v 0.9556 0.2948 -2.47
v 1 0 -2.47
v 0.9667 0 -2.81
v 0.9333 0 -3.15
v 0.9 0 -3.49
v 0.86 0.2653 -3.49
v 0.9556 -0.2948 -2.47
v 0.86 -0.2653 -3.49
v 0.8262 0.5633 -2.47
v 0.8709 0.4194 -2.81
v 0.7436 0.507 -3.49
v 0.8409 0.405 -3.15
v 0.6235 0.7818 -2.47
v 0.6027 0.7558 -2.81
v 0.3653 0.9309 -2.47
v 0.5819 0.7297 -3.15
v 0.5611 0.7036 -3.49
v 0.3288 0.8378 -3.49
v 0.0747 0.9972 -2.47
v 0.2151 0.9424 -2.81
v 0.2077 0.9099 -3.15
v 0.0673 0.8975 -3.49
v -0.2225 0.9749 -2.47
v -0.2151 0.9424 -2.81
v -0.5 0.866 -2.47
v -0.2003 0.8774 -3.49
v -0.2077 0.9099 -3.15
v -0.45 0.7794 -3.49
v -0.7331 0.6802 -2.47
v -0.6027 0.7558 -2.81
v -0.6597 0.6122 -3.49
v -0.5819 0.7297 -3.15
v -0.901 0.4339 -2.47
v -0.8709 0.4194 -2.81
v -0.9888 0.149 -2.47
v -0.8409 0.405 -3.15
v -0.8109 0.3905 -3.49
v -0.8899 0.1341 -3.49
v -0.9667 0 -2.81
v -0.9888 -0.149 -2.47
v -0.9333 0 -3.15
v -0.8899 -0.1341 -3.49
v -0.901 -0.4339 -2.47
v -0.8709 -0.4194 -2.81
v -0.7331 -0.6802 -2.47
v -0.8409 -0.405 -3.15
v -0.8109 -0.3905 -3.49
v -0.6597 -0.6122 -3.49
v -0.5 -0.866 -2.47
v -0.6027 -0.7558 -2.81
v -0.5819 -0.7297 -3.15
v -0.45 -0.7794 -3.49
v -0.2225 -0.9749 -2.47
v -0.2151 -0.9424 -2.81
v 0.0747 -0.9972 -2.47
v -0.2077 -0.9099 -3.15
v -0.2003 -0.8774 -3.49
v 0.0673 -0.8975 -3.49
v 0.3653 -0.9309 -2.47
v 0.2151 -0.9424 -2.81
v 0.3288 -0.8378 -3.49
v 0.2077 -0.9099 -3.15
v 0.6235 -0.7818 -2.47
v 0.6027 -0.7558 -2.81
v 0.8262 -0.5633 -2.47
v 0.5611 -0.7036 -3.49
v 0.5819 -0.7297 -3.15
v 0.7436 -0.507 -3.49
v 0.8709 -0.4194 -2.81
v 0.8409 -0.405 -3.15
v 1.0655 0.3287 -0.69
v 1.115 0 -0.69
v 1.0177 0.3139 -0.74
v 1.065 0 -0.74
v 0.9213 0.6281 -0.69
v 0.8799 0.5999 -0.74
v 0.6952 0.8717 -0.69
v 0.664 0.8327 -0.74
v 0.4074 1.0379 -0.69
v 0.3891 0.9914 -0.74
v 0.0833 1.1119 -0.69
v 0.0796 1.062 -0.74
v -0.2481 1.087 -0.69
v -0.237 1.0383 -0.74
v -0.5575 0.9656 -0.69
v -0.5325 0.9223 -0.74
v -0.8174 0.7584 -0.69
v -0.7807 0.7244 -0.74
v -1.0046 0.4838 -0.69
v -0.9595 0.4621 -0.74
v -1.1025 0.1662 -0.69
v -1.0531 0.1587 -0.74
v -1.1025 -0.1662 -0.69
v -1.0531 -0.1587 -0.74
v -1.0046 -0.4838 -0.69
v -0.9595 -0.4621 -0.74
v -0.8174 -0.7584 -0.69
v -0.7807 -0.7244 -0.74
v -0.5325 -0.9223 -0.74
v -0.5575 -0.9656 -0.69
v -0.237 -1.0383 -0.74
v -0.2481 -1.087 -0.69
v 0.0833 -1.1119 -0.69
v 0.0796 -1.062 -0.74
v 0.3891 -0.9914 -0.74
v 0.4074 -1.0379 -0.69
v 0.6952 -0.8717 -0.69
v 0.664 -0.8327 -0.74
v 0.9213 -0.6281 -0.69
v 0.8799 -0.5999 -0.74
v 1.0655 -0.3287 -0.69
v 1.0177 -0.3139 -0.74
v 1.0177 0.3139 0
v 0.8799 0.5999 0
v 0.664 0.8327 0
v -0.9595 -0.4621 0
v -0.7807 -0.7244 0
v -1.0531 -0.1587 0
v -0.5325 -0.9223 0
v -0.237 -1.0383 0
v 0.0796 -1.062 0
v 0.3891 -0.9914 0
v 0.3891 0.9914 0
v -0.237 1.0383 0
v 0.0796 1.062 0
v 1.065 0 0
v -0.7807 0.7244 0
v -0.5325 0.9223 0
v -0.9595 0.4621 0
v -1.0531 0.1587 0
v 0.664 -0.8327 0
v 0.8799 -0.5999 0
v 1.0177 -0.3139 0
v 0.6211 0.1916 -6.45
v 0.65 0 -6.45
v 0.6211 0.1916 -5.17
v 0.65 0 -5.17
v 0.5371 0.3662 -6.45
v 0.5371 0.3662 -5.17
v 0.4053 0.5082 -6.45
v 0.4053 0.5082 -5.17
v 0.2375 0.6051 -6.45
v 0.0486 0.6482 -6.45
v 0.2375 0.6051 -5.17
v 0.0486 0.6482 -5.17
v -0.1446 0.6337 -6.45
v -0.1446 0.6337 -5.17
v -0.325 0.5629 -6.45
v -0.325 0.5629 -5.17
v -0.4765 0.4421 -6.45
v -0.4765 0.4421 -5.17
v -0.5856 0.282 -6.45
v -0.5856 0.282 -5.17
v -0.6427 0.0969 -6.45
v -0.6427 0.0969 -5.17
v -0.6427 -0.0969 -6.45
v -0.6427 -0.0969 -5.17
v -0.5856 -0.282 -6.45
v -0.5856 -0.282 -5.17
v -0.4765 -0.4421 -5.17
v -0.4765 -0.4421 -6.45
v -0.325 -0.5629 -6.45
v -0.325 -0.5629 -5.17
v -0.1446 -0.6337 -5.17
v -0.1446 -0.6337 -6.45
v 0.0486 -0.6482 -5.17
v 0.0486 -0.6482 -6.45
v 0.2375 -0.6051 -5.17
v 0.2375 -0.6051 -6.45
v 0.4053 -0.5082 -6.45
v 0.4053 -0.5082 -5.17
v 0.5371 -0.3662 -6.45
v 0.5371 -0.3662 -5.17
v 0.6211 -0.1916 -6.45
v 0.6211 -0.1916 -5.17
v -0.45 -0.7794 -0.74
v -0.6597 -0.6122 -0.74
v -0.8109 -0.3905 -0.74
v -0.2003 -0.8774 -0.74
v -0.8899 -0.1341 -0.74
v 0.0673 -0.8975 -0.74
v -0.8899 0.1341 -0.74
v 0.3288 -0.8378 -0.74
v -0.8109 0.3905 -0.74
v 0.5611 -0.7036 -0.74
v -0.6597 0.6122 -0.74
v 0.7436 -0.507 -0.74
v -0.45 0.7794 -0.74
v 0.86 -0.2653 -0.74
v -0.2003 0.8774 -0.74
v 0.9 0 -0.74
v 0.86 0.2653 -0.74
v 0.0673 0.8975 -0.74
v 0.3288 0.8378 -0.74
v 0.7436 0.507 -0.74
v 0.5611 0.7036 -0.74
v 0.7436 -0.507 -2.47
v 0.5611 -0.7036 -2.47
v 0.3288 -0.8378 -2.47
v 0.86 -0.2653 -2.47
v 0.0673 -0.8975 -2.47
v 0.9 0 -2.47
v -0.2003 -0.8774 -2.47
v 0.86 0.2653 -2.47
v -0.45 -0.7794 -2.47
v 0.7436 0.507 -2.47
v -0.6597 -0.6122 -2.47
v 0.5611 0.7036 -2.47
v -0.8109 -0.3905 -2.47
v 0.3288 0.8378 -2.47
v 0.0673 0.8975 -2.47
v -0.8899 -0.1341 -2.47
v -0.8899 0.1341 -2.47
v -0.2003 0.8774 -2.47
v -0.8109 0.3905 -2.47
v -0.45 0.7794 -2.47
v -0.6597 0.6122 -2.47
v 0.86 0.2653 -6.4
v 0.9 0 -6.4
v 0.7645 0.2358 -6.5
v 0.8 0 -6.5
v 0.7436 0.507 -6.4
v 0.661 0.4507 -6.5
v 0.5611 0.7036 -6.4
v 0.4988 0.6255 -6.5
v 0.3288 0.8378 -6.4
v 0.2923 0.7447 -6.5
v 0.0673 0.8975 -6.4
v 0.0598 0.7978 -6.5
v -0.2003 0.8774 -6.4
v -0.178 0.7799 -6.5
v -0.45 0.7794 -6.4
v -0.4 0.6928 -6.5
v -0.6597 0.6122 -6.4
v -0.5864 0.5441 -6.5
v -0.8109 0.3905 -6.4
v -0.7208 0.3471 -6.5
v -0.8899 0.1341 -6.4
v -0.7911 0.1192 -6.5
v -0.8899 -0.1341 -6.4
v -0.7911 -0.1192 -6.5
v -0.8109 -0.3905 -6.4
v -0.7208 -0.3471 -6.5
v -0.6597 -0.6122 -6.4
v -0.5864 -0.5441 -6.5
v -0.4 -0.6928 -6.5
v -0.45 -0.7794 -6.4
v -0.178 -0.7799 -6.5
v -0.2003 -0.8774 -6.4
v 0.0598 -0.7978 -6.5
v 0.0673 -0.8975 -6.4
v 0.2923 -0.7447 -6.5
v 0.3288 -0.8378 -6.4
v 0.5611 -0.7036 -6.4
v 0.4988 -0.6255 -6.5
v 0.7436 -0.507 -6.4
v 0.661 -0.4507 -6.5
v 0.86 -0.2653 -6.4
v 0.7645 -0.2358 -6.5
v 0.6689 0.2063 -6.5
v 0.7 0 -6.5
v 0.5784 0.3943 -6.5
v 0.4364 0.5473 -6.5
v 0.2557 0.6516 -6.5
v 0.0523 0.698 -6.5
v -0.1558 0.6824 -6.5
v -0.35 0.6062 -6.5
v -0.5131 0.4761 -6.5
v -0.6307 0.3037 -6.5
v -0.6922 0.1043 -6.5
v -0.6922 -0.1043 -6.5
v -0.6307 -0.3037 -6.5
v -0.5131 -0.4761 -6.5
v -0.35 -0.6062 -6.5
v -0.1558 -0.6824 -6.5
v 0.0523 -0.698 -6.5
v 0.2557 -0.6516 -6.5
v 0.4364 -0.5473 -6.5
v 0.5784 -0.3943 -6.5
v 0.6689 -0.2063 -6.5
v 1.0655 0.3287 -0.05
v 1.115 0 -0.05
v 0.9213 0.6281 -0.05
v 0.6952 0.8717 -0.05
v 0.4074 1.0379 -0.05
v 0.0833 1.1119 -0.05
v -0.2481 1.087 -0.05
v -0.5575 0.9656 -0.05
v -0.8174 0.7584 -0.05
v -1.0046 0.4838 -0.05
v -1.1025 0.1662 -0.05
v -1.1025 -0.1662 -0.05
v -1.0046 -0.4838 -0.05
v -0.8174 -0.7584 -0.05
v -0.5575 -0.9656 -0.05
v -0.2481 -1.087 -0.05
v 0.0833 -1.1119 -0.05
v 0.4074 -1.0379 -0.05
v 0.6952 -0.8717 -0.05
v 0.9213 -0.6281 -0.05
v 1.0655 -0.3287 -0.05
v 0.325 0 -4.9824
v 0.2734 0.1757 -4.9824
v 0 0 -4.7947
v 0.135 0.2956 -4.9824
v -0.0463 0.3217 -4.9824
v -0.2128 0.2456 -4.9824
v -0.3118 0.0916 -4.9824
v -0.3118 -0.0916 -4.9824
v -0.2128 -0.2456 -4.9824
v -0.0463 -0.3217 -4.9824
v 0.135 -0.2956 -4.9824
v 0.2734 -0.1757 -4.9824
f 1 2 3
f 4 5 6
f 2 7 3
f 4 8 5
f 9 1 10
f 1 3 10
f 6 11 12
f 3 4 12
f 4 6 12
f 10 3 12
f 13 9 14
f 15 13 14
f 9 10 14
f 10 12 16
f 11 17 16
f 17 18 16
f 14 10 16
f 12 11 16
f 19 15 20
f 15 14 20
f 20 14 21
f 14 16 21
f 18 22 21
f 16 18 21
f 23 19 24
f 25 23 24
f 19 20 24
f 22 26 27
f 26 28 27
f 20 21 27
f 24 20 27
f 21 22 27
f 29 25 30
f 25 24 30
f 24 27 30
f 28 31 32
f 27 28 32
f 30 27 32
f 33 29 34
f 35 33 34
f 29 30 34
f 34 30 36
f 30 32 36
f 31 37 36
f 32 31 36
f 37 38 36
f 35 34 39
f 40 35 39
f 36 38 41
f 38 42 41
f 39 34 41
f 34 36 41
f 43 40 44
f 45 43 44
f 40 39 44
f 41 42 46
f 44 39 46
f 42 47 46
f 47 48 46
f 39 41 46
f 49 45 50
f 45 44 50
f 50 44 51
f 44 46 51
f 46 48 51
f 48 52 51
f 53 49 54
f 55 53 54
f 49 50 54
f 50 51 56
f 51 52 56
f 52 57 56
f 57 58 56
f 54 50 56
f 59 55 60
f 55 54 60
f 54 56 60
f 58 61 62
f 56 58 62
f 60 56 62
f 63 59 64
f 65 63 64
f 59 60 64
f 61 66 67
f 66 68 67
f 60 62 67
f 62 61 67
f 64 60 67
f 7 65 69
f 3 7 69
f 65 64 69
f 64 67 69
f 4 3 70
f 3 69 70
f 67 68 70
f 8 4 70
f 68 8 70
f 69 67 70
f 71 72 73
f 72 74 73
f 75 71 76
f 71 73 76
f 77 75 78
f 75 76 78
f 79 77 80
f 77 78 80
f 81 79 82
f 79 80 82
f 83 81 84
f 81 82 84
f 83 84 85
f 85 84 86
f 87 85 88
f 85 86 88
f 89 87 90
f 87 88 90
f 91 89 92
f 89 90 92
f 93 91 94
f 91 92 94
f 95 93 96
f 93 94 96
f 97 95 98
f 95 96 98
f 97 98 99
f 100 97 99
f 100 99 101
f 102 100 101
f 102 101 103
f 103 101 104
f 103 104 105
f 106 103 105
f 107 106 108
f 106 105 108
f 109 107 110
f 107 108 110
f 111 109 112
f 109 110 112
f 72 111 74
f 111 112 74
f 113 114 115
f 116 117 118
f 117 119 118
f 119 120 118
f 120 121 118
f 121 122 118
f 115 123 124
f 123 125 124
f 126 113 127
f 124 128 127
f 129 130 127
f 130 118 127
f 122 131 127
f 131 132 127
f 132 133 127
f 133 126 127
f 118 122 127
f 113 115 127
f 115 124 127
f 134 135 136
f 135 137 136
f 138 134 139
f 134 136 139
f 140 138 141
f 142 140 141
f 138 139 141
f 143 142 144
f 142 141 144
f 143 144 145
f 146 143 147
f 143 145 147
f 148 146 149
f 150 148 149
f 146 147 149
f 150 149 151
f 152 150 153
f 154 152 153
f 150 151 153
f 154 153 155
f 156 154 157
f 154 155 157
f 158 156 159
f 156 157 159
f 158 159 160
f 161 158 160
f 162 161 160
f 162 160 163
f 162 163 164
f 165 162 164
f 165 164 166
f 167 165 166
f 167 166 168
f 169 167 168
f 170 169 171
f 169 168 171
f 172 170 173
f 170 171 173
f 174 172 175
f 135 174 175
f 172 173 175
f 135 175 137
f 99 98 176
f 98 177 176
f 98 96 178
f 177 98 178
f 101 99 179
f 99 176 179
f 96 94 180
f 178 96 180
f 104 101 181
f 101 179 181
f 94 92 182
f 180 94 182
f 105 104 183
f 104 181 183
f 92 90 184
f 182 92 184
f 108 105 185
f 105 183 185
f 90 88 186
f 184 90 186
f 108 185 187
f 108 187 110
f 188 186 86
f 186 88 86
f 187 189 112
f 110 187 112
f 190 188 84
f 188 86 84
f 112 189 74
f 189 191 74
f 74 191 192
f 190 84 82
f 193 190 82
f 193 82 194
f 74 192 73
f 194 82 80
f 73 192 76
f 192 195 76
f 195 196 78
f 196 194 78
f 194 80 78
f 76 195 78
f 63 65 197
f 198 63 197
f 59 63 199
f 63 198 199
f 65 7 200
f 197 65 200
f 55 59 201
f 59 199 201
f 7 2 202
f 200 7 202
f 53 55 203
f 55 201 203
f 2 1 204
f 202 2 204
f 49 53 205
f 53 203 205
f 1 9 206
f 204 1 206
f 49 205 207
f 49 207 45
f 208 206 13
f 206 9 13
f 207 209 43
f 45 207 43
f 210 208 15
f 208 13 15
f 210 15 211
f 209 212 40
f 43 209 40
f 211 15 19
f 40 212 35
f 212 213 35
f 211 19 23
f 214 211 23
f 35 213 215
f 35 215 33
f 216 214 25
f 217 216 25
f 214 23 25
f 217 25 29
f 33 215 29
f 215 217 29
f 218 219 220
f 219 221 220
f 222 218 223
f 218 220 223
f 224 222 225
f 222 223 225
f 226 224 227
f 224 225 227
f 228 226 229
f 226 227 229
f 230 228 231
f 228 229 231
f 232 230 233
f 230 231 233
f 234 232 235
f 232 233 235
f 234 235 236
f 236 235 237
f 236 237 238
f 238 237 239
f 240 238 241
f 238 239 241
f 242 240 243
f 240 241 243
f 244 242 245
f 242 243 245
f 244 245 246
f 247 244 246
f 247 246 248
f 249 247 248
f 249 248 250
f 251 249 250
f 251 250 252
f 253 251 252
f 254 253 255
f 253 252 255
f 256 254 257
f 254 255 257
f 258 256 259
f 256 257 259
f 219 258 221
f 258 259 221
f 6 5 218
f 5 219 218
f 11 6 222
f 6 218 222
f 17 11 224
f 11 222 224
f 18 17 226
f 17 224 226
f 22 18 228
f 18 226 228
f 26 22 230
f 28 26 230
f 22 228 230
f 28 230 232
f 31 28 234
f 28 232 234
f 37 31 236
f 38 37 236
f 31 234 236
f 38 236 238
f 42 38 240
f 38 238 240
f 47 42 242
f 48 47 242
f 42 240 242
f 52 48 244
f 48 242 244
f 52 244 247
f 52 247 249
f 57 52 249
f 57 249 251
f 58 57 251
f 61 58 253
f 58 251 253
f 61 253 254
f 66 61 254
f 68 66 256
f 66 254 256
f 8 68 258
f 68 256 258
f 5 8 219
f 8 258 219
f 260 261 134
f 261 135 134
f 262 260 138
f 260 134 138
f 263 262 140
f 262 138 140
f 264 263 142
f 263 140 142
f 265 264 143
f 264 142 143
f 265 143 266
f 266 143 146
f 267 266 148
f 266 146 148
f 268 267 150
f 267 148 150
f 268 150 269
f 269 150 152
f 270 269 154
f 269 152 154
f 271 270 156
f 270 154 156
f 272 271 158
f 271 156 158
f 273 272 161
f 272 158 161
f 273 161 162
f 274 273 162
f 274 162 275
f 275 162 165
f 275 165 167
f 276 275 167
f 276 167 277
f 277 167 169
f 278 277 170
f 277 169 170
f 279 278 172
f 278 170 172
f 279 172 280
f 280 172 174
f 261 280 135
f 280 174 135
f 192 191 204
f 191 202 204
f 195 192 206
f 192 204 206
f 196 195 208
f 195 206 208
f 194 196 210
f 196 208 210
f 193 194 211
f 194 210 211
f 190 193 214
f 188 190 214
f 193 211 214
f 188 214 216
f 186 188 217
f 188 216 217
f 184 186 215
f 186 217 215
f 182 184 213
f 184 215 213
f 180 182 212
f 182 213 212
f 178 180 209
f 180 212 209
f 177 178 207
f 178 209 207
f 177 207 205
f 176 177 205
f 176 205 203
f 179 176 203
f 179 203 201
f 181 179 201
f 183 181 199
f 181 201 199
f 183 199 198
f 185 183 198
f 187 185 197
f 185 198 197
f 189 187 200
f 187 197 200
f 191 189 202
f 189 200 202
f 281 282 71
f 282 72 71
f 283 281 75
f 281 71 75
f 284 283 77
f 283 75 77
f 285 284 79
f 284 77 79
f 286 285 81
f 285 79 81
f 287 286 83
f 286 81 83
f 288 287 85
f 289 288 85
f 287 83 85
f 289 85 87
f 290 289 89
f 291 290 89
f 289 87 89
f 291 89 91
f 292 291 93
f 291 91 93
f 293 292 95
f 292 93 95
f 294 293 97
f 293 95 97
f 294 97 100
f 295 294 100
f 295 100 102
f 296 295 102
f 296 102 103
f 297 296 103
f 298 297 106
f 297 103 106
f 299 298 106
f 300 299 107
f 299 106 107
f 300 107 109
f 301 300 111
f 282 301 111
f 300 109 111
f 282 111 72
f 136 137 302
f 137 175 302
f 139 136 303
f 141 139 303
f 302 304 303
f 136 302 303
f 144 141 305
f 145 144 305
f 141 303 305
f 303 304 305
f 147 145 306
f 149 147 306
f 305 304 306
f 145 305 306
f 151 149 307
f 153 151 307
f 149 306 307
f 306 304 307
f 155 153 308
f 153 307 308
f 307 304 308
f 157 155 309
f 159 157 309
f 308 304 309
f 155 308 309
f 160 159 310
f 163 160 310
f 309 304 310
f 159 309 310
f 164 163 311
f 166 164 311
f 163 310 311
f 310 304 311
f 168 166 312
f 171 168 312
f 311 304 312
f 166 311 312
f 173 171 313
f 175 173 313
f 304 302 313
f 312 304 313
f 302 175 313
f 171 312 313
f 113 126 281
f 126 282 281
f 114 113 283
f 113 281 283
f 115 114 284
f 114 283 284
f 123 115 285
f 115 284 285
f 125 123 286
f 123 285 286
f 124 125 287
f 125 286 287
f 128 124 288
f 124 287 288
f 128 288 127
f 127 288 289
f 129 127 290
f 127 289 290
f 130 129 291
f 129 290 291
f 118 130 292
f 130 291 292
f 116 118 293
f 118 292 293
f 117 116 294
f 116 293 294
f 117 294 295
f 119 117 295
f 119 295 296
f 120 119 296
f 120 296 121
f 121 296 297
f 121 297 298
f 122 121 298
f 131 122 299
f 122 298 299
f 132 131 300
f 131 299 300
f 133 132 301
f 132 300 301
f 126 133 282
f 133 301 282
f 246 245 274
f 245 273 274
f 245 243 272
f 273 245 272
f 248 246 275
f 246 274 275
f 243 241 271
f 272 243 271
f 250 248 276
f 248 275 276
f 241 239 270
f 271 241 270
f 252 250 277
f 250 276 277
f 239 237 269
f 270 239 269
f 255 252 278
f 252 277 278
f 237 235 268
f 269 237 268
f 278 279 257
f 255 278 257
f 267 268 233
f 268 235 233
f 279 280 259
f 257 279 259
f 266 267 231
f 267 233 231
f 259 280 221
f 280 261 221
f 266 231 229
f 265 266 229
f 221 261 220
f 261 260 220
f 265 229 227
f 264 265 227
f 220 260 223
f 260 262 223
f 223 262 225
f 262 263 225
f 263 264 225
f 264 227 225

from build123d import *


with BuildPart() as part:
    # Esquisse1 → Révolution1 (revolve)
    with BuildSketch(Plane(origin=(0, 0, 0), x_dir=(1, 0, 0), z_dir=(0, 1, 0))):
        Polygon((0.65, 5.17), (0, 4.794722325), (0, 0), (1.065, 0), (1.115, 0.05), (1.115, 0.69), (1.065, 0.74), (0.9, 0.74), (0.9, 2.47), (1, 2.47), (0.9, 3.49), (0.9, 6.4), (0.8, 6.5), (0.7, 6.5), (0.65, 6.45), align=None)
    revolve(axis=Axis((0, 0, -6.5), (0, 0, 1)))


solid = part.part
